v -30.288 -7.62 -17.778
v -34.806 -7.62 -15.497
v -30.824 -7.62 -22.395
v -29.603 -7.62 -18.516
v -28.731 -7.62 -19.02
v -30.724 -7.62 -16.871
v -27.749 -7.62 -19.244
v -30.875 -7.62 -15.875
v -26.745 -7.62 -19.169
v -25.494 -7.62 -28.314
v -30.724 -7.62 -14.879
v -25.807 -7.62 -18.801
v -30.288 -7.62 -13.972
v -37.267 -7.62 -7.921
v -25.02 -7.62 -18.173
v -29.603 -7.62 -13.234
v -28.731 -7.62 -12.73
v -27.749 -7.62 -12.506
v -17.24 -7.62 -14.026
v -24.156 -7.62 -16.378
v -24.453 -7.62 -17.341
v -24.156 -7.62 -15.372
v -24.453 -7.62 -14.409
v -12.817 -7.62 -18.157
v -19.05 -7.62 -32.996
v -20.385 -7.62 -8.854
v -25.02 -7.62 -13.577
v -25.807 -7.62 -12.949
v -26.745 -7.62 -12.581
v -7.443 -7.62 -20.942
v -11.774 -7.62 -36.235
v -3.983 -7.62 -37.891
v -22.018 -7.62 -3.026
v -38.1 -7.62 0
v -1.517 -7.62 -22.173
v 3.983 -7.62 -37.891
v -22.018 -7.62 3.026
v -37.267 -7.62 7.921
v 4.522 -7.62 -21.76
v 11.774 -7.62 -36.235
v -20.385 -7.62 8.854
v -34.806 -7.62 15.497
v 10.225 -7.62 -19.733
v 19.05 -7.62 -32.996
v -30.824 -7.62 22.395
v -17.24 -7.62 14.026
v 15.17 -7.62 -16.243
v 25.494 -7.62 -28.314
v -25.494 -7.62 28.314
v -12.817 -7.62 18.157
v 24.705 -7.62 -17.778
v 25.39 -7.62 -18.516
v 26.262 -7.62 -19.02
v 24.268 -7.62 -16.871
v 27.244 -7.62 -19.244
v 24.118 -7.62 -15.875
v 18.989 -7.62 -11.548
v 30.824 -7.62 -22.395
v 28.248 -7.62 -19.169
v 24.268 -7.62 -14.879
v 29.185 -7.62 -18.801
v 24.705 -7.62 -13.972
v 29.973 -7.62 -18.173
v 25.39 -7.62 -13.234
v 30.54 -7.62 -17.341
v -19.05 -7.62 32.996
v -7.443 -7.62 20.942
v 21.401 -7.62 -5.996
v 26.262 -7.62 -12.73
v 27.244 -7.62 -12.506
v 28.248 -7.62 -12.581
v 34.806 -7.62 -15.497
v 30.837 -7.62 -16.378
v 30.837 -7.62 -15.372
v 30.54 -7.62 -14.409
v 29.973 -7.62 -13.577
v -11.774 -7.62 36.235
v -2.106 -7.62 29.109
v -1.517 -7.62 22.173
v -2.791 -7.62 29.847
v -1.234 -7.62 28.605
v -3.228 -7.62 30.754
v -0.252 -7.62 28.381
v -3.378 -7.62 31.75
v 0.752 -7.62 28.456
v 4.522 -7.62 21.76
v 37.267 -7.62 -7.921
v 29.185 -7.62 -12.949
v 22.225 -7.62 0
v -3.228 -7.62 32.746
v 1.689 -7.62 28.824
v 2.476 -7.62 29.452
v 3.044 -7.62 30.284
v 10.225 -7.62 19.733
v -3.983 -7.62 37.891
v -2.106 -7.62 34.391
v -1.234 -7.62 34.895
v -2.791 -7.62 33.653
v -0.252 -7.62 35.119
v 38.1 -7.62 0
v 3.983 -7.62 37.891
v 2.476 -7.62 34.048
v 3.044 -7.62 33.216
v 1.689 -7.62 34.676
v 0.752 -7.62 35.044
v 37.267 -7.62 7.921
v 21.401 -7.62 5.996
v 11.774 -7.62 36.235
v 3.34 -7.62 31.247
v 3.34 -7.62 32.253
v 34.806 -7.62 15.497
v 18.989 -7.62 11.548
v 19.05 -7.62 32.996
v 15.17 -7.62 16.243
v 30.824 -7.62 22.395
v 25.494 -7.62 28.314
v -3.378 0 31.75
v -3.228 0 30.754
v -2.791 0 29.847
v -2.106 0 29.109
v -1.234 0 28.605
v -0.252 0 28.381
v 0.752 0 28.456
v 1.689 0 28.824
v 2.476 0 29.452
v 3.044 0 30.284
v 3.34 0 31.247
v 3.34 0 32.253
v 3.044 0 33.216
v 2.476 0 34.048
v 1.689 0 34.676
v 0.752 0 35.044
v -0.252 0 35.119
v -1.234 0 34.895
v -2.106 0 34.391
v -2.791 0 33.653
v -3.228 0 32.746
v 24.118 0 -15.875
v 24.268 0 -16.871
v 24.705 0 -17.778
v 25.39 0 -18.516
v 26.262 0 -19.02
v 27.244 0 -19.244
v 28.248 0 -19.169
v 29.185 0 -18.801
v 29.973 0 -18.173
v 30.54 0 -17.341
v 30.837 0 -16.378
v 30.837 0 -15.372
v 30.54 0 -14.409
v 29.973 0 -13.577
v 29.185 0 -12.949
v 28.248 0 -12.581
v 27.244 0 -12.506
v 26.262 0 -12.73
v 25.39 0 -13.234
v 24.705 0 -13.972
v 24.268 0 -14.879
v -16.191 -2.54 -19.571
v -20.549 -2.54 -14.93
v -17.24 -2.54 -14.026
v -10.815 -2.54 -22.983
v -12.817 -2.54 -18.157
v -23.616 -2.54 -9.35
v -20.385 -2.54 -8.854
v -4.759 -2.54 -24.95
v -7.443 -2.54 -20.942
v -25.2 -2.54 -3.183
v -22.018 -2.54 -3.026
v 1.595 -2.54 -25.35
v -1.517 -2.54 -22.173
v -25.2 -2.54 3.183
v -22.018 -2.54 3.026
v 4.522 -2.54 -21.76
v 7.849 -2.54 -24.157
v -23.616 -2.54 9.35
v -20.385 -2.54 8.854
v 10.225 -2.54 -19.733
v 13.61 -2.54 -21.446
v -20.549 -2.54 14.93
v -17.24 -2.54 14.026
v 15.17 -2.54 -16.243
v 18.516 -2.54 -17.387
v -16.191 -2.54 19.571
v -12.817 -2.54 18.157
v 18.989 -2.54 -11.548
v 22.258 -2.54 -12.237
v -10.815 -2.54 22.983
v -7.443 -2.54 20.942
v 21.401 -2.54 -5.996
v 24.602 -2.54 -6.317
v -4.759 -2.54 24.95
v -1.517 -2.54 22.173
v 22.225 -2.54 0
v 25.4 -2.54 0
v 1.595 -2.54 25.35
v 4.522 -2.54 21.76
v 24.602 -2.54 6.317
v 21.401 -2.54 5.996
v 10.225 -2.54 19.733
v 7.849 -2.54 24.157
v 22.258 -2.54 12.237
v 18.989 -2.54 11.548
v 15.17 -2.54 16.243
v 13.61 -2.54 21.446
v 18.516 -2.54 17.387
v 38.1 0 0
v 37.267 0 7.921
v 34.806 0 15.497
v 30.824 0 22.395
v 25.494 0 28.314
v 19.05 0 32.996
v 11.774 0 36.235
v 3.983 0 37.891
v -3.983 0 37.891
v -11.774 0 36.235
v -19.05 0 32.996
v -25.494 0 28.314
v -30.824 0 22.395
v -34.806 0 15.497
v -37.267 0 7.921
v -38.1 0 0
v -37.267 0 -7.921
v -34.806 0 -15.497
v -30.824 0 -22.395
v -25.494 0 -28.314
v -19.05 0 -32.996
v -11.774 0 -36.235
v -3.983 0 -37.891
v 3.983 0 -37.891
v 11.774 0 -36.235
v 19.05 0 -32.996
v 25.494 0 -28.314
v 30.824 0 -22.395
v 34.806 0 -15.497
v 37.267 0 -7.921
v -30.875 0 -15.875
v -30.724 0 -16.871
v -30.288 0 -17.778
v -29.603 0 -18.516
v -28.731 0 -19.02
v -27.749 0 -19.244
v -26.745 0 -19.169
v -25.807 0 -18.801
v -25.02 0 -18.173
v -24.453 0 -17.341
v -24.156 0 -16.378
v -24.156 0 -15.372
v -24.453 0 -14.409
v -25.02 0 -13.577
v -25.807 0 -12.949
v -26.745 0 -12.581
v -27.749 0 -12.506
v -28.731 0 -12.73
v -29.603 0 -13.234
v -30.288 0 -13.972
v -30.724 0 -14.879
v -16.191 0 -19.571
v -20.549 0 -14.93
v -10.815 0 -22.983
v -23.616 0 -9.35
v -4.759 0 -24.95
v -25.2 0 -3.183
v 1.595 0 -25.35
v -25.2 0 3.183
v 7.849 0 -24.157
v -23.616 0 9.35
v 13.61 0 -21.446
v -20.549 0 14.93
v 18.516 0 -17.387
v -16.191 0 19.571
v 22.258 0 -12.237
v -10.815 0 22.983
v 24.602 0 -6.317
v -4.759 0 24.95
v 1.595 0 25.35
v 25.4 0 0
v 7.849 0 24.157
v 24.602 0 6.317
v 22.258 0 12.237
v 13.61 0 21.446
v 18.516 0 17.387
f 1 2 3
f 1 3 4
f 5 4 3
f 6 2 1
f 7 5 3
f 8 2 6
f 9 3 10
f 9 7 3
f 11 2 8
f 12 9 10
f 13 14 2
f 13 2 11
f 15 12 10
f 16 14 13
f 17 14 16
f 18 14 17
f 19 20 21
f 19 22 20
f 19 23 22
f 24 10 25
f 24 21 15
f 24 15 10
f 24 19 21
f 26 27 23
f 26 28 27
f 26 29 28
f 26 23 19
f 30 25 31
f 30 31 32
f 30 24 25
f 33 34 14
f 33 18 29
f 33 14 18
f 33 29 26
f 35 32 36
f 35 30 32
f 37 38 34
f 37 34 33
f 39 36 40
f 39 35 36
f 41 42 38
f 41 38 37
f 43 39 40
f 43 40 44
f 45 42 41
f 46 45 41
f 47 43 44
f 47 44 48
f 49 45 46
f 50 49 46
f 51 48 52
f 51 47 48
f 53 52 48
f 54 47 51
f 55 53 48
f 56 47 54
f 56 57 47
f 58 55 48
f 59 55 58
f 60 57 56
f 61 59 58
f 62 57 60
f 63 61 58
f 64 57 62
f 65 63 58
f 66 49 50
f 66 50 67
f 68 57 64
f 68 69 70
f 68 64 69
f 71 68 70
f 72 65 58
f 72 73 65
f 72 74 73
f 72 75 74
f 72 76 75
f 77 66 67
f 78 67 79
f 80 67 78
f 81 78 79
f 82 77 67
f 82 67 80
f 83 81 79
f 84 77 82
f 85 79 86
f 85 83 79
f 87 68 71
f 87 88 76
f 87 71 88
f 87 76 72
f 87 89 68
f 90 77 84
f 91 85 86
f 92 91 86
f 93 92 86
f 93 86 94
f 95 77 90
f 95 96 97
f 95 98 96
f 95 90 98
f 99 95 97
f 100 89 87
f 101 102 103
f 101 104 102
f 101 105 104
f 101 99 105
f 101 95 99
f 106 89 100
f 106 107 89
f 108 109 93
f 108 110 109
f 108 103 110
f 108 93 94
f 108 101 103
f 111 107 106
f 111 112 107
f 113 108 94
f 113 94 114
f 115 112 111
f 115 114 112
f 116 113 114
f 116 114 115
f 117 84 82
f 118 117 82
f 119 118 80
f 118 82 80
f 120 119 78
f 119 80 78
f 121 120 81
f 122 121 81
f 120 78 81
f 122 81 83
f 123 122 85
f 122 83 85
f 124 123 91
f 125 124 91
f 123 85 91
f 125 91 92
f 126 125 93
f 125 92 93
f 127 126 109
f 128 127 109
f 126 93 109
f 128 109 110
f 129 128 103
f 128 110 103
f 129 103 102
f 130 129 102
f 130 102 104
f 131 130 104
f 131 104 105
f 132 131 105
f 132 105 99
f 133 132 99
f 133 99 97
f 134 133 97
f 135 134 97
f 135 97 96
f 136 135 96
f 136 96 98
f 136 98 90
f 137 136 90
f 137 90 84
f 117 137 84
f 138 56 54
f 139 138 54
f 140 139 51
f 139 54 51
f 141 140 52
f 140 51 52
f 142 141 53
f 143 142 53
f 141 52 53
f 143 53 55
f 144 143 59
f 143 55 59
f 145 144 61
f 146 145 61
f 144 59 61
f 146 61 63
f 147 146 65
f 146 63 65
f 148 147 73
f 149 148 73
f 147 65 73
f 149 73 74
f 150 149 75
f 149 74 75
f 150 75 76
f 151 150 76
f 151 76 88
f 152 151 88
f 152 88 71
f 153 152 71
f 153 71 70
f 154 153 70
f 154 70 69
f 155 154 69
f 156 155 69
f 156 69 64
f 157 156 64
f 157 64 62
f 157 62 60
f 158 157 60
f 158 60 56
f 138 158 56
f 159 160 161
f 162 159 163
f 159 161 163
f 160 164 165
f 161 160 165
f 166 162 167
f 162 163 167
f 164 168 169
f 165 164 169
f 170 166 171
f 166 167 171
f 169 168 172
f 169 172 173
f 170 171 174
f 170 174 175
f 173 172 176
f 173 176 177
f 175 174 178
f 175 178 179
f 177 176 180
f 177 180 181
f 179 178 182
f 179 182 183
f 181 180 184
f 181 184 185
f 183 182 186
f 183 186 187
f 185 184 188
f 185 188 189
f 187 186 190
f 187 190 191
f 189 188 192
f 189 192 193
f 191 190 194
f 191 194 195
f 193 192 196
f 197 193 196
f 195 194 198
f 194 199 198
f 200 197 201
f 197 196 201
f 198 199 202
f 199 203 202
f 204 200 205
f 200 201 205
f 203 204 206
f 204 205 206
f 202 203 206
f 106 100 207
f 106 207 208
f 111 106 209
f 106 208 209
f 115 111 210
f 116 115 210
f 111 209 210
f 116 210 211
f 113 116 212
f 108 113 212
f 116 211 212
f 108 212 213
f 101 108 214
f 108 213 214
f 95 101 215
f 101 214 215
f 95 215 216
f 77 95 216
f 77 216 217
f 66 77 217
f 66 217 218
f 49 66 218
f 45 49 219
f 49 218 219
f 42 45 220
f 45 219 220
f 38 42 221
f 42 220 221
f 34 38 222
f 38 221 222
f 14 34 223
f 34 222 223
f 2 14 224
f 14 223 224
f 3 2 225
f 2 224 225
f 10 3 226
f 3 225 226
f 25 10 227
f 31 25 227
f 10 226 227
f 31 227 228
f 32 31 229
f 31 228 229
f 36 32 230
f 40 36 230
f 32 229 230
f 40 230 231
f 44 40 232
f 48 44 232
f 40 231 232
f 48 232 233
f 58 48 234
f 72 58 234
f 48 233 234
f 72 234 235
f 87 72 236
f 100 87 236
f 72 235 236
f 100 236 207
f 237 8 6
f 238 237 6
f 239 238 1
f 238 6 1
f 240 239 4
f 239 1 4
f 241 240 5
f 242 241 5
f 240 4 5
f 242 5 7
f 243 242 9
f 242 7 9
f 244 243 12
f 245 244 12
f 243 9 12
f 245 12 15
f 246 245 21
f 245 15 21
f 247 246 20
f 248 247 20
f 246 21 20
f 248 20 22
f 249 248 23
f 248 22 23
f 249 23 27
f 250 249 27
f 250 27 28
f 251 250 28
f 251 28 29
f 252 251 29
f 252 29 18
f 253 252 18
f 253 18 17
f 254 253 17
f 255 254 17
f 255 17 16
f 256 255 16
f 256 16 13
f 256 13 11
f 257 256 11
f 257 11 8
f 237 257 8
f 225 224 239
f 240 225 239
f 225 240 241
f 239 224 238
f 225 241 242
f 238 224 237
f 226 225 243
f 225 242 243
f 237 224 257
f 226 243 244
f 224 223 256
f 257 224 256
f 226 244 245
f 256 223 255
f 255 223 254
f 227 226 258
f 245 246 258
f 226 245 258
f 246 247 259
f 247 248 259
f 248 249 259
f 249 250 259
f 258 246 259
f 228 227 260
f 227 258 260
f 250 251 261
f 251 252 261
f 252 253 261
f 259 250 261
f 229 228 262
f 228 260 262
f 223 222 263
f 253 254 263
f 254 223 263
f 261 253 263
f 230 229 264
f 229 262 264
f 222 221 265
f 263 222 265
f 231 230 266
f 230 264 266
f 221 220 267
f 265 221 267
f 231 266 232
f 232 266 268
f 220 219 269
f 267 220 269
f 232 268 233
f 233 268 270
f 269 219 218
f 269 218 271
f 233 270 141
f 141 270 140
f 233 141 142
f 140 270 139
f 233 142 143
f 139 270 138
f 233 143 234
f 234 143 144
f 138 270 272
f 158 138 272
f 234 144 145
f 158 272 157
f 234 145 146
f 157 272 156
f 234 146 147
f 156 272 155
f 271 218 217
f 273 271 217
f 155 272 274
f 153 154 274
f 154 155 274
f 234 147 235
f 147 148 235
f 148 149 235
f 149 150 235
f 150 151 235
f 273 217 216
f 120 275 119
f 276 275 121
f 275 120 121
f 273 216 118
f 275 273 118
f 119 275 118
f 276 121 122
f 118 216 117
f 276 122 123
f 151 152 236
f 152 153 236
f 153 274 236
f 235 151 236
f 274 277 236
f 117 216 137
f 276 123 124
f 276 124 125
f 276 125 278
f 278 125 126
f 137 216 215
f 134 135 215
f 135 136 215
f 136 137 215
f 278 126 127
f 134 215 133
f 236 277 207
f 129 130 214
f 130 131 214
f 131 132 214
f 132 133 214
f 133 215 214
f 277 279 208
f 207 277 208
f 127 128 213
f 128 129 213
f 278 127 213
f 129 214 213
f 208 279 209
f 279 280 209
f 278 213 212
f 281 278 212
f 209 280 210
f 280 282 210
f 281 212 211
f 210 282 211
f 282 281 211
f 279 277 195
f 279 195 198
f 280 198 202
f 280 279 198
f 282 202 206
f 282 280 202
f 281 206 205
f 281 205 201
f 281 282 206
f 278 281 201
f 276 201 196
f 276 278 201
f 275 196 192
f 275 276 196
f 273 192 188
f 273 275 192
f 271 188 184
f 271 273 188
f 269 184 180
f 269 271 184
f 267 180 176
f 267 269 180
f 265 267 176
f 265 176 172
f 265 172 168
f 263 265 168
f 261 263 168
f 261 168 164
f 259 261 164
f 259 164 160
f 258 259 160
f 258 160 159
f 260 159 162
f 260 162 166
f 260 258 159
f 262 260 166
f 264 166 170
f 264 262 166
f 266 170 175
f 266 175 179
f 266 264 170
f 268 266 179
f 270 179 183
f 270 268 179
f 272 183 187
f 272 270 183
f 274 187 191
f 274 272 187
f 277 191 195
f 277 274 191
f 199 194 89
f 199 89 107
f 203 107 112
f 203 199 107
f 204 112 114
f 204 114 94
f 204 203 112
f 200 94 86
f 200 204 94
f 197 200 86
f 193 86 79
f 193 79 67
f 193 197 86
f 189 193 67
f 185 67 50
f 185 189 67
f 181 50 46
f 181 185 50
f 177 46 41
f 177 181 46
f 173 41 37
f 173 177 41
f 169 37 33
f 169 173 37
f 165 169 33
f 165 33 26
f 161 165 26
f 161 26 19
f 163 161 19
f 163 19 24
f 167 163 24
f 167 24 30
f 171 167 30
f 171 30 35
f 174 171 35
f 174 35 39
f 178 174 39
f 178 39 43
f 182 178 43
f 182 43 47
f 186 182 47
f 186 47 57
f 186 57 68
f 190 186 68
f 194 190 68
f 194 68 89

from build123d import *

# Parameters (mm, degrees)
F0_R     = 38.1
F0_R_2   = 25.4
F0_R_3   = 22.225
F1_DEPTH = 7.62
F2_DEPTH = 2.54
F3_D     = 6.7564


with BuildPart() as f1:
    # F0 (on Front) → F1 (new body)
    with BuildSketch(Plane.XZ):
        Circle(F0_R)
        with BuildLine():
            ThreePointArc((2.1860537536, 31.6746534154), (23.2106624925, 21.6639711655), (31.75, 0))
            ThreePointArc((31.75, 0), (30.9330089399, -7.15621813), (28.5240813906, -13.944148623))
            ThreePointArc((28.5240813906, -13.944148623), (29.3714883317, -14.7488554788), (29.6836584215, -15.875))
            ThreePointArc((29.6836584215, -15.875), (28.5571893518, -17.7878606445), (26.338027637, -17.7305047924))
            ThreePointArc((26.338027637, -17.7305047924), (0, -31.75), (-26.338027637, -17.7305047924))
            ThreePointArc((-26.338027637, -17.7305047924), (-29.3906088404, -16.9686759257), (-28.5240813906, -13.944148623))
            ThreePointArc((-28.5240813906, -13.944148623), (-27.4963065702, 15.875), (-2.1860537536, 31.6746534154))
            ThreePointArc((-2.1860537536, 31.6746534154), (-0.0376788829, 33.9370273028), (2.1873518513, 31.75))
            ThreePointArc((2.1873518513, 31.75), (2.1870273028, 31.7123211171), (2.1860537536, 31.6746534154))
        make_face(mode=Mode.SUBTRACT)
        with BuildLine():
            ThreePointArc((28.5240813906, -13.944148623), (30.9330089399, -7.15621813), (31.75, 0))
            ThreePointArc((31.75, 0), (23.2106624925, 21.6639711655), (2.1860537536, 31.6746534154))
            ThreePointArc((2.1860537536, 31.6746534154), (0, 29.5626481487), (-2.1860537536, 31.6746534154))
            ThreePointArc((-2.1860537536, 31.6746534154), (-27.4963065702, 15.875), (-28.5240813906, -13.944148623))
            ThreePointArc((-28.5240813906, -13.944148623), (-26.370162049, -13.9998182384), (-25.3089547188, -15.875))
            ThreePointArc((-25.3089547188, -15.875), (-25.5834459257, -16.9358827816), (-26.338027637, -17.7305047924))
            ThreePointArc((-26.338027637, -17.7305047924), (0, -31.75), (26.338027637, -17.7305047924))
            ThreePointArc((26.338027637, -17.7305047924), (25.6020042999, -14.7813240743), (28.5240813906, -13.944148623))
        make_face()
        Circle(F0_R_2, mode=Mode.SUBTRACT)
        Circle(F0_R_2)
        Circle(F0_R_3, mode=Mode.SUBTRACT)
        with BuildLine():
            ThreePointArc((-2.1860537536, 31.6746534154), (0, 31.75), (2.1860537536, 31.6746534154))
            ThreePointArc((2.1860537536, 31.6746534154), (2.1870273028, 31.7123211171), (2.1873518513, 31.75))
            ThreePointArc((2.1873518513, 31.75), (-0.0376788829, 33.9370273028), (-2.1860537536, 31.6746534154))
        make_face()
        with BuildLine():
            ThreePointArc((-2.1860537536, 31.6746534154), (0, 29.5626481487), (2.1860537536, 31.6746534154))
            ThreePointArc((2.1860537536, 31.6746534154), (0, 31.75), (-2.1860537536, 31.6746534154))
        make_face()
        with BuildLine():
            ThreePointArc((-26.338027637, -17.7305047924), (-27.4963065702, -15.875), (-28.5240813906, -13.944148623))
            ThreePointArc((-28.5240813906, -13.944148623), (-29.3906088404, -16.9686759257), (-26.338027637, -17.7305047924))
        make_face()
        with BuildLine():
            ThreePointArc((-25.3089547188, -15.875), (-26.370162049, -13.9998182384), (-28.5240813906, -13.944148623))
            ThreePointArc((-28.5240813906, -13.944148623), (-27.4963065702, -15.875), (-26.338027637, -17.7305047924))
            ThreePointArc((-26.338027637, -17.7305047924), (-25.5834459257, -16.9358827816), (-25.3089547188, -15.875))
        make_face()
        with BuildLine():
            ThreePointArc((29.6836584215, -15.875), (29.3714883317, -14.7488554788), (28.5240813906, -13.944148623))
            ThreePointArc((28.5240813906, -13.944148623), (27.4963065702, -15.875), (26.338027637, -17.7305047924))
            ThreePointArc((26.338027637, -17.7305047924), (28.5571893518, -17.7878606445), (29.6836584215, -15.875))
        make_face()
        with BuildLine():
            ThreePointArc((26.338027637, -17.7305047924), (27.4963065702, -15.875), (28.5240813906, -13.944148623))
            ThreePointArc((28.5240813906, -13.944148623), (25.6020042999, -14.7813240743), (26.338027637, -17.7305047924))
        make_face()
    extrude(amount=F1_DEPTH)

    # F0 (on Front) → F2 (cut)
    with BuildSketch(Plane.XZ):
        Circle(F0_R_2)
        Circle(F0_R_3, mode=Mode.SUBTRACT)
    extrude(amount=F2_DEPTH, mode=Mode.SUBTRACT)

    # F3 (through all)
    with Locations(Plane(origin=(0, 0, 0), x_dir=(1, 0, 0), z_dir=(0, 1, 0))):
        with Locations((27.4963065702, 15.875), (-27.4963065702, 15.875), (0, -31.75)):
            Hole(F3_D / 2)


solid = f1.part
